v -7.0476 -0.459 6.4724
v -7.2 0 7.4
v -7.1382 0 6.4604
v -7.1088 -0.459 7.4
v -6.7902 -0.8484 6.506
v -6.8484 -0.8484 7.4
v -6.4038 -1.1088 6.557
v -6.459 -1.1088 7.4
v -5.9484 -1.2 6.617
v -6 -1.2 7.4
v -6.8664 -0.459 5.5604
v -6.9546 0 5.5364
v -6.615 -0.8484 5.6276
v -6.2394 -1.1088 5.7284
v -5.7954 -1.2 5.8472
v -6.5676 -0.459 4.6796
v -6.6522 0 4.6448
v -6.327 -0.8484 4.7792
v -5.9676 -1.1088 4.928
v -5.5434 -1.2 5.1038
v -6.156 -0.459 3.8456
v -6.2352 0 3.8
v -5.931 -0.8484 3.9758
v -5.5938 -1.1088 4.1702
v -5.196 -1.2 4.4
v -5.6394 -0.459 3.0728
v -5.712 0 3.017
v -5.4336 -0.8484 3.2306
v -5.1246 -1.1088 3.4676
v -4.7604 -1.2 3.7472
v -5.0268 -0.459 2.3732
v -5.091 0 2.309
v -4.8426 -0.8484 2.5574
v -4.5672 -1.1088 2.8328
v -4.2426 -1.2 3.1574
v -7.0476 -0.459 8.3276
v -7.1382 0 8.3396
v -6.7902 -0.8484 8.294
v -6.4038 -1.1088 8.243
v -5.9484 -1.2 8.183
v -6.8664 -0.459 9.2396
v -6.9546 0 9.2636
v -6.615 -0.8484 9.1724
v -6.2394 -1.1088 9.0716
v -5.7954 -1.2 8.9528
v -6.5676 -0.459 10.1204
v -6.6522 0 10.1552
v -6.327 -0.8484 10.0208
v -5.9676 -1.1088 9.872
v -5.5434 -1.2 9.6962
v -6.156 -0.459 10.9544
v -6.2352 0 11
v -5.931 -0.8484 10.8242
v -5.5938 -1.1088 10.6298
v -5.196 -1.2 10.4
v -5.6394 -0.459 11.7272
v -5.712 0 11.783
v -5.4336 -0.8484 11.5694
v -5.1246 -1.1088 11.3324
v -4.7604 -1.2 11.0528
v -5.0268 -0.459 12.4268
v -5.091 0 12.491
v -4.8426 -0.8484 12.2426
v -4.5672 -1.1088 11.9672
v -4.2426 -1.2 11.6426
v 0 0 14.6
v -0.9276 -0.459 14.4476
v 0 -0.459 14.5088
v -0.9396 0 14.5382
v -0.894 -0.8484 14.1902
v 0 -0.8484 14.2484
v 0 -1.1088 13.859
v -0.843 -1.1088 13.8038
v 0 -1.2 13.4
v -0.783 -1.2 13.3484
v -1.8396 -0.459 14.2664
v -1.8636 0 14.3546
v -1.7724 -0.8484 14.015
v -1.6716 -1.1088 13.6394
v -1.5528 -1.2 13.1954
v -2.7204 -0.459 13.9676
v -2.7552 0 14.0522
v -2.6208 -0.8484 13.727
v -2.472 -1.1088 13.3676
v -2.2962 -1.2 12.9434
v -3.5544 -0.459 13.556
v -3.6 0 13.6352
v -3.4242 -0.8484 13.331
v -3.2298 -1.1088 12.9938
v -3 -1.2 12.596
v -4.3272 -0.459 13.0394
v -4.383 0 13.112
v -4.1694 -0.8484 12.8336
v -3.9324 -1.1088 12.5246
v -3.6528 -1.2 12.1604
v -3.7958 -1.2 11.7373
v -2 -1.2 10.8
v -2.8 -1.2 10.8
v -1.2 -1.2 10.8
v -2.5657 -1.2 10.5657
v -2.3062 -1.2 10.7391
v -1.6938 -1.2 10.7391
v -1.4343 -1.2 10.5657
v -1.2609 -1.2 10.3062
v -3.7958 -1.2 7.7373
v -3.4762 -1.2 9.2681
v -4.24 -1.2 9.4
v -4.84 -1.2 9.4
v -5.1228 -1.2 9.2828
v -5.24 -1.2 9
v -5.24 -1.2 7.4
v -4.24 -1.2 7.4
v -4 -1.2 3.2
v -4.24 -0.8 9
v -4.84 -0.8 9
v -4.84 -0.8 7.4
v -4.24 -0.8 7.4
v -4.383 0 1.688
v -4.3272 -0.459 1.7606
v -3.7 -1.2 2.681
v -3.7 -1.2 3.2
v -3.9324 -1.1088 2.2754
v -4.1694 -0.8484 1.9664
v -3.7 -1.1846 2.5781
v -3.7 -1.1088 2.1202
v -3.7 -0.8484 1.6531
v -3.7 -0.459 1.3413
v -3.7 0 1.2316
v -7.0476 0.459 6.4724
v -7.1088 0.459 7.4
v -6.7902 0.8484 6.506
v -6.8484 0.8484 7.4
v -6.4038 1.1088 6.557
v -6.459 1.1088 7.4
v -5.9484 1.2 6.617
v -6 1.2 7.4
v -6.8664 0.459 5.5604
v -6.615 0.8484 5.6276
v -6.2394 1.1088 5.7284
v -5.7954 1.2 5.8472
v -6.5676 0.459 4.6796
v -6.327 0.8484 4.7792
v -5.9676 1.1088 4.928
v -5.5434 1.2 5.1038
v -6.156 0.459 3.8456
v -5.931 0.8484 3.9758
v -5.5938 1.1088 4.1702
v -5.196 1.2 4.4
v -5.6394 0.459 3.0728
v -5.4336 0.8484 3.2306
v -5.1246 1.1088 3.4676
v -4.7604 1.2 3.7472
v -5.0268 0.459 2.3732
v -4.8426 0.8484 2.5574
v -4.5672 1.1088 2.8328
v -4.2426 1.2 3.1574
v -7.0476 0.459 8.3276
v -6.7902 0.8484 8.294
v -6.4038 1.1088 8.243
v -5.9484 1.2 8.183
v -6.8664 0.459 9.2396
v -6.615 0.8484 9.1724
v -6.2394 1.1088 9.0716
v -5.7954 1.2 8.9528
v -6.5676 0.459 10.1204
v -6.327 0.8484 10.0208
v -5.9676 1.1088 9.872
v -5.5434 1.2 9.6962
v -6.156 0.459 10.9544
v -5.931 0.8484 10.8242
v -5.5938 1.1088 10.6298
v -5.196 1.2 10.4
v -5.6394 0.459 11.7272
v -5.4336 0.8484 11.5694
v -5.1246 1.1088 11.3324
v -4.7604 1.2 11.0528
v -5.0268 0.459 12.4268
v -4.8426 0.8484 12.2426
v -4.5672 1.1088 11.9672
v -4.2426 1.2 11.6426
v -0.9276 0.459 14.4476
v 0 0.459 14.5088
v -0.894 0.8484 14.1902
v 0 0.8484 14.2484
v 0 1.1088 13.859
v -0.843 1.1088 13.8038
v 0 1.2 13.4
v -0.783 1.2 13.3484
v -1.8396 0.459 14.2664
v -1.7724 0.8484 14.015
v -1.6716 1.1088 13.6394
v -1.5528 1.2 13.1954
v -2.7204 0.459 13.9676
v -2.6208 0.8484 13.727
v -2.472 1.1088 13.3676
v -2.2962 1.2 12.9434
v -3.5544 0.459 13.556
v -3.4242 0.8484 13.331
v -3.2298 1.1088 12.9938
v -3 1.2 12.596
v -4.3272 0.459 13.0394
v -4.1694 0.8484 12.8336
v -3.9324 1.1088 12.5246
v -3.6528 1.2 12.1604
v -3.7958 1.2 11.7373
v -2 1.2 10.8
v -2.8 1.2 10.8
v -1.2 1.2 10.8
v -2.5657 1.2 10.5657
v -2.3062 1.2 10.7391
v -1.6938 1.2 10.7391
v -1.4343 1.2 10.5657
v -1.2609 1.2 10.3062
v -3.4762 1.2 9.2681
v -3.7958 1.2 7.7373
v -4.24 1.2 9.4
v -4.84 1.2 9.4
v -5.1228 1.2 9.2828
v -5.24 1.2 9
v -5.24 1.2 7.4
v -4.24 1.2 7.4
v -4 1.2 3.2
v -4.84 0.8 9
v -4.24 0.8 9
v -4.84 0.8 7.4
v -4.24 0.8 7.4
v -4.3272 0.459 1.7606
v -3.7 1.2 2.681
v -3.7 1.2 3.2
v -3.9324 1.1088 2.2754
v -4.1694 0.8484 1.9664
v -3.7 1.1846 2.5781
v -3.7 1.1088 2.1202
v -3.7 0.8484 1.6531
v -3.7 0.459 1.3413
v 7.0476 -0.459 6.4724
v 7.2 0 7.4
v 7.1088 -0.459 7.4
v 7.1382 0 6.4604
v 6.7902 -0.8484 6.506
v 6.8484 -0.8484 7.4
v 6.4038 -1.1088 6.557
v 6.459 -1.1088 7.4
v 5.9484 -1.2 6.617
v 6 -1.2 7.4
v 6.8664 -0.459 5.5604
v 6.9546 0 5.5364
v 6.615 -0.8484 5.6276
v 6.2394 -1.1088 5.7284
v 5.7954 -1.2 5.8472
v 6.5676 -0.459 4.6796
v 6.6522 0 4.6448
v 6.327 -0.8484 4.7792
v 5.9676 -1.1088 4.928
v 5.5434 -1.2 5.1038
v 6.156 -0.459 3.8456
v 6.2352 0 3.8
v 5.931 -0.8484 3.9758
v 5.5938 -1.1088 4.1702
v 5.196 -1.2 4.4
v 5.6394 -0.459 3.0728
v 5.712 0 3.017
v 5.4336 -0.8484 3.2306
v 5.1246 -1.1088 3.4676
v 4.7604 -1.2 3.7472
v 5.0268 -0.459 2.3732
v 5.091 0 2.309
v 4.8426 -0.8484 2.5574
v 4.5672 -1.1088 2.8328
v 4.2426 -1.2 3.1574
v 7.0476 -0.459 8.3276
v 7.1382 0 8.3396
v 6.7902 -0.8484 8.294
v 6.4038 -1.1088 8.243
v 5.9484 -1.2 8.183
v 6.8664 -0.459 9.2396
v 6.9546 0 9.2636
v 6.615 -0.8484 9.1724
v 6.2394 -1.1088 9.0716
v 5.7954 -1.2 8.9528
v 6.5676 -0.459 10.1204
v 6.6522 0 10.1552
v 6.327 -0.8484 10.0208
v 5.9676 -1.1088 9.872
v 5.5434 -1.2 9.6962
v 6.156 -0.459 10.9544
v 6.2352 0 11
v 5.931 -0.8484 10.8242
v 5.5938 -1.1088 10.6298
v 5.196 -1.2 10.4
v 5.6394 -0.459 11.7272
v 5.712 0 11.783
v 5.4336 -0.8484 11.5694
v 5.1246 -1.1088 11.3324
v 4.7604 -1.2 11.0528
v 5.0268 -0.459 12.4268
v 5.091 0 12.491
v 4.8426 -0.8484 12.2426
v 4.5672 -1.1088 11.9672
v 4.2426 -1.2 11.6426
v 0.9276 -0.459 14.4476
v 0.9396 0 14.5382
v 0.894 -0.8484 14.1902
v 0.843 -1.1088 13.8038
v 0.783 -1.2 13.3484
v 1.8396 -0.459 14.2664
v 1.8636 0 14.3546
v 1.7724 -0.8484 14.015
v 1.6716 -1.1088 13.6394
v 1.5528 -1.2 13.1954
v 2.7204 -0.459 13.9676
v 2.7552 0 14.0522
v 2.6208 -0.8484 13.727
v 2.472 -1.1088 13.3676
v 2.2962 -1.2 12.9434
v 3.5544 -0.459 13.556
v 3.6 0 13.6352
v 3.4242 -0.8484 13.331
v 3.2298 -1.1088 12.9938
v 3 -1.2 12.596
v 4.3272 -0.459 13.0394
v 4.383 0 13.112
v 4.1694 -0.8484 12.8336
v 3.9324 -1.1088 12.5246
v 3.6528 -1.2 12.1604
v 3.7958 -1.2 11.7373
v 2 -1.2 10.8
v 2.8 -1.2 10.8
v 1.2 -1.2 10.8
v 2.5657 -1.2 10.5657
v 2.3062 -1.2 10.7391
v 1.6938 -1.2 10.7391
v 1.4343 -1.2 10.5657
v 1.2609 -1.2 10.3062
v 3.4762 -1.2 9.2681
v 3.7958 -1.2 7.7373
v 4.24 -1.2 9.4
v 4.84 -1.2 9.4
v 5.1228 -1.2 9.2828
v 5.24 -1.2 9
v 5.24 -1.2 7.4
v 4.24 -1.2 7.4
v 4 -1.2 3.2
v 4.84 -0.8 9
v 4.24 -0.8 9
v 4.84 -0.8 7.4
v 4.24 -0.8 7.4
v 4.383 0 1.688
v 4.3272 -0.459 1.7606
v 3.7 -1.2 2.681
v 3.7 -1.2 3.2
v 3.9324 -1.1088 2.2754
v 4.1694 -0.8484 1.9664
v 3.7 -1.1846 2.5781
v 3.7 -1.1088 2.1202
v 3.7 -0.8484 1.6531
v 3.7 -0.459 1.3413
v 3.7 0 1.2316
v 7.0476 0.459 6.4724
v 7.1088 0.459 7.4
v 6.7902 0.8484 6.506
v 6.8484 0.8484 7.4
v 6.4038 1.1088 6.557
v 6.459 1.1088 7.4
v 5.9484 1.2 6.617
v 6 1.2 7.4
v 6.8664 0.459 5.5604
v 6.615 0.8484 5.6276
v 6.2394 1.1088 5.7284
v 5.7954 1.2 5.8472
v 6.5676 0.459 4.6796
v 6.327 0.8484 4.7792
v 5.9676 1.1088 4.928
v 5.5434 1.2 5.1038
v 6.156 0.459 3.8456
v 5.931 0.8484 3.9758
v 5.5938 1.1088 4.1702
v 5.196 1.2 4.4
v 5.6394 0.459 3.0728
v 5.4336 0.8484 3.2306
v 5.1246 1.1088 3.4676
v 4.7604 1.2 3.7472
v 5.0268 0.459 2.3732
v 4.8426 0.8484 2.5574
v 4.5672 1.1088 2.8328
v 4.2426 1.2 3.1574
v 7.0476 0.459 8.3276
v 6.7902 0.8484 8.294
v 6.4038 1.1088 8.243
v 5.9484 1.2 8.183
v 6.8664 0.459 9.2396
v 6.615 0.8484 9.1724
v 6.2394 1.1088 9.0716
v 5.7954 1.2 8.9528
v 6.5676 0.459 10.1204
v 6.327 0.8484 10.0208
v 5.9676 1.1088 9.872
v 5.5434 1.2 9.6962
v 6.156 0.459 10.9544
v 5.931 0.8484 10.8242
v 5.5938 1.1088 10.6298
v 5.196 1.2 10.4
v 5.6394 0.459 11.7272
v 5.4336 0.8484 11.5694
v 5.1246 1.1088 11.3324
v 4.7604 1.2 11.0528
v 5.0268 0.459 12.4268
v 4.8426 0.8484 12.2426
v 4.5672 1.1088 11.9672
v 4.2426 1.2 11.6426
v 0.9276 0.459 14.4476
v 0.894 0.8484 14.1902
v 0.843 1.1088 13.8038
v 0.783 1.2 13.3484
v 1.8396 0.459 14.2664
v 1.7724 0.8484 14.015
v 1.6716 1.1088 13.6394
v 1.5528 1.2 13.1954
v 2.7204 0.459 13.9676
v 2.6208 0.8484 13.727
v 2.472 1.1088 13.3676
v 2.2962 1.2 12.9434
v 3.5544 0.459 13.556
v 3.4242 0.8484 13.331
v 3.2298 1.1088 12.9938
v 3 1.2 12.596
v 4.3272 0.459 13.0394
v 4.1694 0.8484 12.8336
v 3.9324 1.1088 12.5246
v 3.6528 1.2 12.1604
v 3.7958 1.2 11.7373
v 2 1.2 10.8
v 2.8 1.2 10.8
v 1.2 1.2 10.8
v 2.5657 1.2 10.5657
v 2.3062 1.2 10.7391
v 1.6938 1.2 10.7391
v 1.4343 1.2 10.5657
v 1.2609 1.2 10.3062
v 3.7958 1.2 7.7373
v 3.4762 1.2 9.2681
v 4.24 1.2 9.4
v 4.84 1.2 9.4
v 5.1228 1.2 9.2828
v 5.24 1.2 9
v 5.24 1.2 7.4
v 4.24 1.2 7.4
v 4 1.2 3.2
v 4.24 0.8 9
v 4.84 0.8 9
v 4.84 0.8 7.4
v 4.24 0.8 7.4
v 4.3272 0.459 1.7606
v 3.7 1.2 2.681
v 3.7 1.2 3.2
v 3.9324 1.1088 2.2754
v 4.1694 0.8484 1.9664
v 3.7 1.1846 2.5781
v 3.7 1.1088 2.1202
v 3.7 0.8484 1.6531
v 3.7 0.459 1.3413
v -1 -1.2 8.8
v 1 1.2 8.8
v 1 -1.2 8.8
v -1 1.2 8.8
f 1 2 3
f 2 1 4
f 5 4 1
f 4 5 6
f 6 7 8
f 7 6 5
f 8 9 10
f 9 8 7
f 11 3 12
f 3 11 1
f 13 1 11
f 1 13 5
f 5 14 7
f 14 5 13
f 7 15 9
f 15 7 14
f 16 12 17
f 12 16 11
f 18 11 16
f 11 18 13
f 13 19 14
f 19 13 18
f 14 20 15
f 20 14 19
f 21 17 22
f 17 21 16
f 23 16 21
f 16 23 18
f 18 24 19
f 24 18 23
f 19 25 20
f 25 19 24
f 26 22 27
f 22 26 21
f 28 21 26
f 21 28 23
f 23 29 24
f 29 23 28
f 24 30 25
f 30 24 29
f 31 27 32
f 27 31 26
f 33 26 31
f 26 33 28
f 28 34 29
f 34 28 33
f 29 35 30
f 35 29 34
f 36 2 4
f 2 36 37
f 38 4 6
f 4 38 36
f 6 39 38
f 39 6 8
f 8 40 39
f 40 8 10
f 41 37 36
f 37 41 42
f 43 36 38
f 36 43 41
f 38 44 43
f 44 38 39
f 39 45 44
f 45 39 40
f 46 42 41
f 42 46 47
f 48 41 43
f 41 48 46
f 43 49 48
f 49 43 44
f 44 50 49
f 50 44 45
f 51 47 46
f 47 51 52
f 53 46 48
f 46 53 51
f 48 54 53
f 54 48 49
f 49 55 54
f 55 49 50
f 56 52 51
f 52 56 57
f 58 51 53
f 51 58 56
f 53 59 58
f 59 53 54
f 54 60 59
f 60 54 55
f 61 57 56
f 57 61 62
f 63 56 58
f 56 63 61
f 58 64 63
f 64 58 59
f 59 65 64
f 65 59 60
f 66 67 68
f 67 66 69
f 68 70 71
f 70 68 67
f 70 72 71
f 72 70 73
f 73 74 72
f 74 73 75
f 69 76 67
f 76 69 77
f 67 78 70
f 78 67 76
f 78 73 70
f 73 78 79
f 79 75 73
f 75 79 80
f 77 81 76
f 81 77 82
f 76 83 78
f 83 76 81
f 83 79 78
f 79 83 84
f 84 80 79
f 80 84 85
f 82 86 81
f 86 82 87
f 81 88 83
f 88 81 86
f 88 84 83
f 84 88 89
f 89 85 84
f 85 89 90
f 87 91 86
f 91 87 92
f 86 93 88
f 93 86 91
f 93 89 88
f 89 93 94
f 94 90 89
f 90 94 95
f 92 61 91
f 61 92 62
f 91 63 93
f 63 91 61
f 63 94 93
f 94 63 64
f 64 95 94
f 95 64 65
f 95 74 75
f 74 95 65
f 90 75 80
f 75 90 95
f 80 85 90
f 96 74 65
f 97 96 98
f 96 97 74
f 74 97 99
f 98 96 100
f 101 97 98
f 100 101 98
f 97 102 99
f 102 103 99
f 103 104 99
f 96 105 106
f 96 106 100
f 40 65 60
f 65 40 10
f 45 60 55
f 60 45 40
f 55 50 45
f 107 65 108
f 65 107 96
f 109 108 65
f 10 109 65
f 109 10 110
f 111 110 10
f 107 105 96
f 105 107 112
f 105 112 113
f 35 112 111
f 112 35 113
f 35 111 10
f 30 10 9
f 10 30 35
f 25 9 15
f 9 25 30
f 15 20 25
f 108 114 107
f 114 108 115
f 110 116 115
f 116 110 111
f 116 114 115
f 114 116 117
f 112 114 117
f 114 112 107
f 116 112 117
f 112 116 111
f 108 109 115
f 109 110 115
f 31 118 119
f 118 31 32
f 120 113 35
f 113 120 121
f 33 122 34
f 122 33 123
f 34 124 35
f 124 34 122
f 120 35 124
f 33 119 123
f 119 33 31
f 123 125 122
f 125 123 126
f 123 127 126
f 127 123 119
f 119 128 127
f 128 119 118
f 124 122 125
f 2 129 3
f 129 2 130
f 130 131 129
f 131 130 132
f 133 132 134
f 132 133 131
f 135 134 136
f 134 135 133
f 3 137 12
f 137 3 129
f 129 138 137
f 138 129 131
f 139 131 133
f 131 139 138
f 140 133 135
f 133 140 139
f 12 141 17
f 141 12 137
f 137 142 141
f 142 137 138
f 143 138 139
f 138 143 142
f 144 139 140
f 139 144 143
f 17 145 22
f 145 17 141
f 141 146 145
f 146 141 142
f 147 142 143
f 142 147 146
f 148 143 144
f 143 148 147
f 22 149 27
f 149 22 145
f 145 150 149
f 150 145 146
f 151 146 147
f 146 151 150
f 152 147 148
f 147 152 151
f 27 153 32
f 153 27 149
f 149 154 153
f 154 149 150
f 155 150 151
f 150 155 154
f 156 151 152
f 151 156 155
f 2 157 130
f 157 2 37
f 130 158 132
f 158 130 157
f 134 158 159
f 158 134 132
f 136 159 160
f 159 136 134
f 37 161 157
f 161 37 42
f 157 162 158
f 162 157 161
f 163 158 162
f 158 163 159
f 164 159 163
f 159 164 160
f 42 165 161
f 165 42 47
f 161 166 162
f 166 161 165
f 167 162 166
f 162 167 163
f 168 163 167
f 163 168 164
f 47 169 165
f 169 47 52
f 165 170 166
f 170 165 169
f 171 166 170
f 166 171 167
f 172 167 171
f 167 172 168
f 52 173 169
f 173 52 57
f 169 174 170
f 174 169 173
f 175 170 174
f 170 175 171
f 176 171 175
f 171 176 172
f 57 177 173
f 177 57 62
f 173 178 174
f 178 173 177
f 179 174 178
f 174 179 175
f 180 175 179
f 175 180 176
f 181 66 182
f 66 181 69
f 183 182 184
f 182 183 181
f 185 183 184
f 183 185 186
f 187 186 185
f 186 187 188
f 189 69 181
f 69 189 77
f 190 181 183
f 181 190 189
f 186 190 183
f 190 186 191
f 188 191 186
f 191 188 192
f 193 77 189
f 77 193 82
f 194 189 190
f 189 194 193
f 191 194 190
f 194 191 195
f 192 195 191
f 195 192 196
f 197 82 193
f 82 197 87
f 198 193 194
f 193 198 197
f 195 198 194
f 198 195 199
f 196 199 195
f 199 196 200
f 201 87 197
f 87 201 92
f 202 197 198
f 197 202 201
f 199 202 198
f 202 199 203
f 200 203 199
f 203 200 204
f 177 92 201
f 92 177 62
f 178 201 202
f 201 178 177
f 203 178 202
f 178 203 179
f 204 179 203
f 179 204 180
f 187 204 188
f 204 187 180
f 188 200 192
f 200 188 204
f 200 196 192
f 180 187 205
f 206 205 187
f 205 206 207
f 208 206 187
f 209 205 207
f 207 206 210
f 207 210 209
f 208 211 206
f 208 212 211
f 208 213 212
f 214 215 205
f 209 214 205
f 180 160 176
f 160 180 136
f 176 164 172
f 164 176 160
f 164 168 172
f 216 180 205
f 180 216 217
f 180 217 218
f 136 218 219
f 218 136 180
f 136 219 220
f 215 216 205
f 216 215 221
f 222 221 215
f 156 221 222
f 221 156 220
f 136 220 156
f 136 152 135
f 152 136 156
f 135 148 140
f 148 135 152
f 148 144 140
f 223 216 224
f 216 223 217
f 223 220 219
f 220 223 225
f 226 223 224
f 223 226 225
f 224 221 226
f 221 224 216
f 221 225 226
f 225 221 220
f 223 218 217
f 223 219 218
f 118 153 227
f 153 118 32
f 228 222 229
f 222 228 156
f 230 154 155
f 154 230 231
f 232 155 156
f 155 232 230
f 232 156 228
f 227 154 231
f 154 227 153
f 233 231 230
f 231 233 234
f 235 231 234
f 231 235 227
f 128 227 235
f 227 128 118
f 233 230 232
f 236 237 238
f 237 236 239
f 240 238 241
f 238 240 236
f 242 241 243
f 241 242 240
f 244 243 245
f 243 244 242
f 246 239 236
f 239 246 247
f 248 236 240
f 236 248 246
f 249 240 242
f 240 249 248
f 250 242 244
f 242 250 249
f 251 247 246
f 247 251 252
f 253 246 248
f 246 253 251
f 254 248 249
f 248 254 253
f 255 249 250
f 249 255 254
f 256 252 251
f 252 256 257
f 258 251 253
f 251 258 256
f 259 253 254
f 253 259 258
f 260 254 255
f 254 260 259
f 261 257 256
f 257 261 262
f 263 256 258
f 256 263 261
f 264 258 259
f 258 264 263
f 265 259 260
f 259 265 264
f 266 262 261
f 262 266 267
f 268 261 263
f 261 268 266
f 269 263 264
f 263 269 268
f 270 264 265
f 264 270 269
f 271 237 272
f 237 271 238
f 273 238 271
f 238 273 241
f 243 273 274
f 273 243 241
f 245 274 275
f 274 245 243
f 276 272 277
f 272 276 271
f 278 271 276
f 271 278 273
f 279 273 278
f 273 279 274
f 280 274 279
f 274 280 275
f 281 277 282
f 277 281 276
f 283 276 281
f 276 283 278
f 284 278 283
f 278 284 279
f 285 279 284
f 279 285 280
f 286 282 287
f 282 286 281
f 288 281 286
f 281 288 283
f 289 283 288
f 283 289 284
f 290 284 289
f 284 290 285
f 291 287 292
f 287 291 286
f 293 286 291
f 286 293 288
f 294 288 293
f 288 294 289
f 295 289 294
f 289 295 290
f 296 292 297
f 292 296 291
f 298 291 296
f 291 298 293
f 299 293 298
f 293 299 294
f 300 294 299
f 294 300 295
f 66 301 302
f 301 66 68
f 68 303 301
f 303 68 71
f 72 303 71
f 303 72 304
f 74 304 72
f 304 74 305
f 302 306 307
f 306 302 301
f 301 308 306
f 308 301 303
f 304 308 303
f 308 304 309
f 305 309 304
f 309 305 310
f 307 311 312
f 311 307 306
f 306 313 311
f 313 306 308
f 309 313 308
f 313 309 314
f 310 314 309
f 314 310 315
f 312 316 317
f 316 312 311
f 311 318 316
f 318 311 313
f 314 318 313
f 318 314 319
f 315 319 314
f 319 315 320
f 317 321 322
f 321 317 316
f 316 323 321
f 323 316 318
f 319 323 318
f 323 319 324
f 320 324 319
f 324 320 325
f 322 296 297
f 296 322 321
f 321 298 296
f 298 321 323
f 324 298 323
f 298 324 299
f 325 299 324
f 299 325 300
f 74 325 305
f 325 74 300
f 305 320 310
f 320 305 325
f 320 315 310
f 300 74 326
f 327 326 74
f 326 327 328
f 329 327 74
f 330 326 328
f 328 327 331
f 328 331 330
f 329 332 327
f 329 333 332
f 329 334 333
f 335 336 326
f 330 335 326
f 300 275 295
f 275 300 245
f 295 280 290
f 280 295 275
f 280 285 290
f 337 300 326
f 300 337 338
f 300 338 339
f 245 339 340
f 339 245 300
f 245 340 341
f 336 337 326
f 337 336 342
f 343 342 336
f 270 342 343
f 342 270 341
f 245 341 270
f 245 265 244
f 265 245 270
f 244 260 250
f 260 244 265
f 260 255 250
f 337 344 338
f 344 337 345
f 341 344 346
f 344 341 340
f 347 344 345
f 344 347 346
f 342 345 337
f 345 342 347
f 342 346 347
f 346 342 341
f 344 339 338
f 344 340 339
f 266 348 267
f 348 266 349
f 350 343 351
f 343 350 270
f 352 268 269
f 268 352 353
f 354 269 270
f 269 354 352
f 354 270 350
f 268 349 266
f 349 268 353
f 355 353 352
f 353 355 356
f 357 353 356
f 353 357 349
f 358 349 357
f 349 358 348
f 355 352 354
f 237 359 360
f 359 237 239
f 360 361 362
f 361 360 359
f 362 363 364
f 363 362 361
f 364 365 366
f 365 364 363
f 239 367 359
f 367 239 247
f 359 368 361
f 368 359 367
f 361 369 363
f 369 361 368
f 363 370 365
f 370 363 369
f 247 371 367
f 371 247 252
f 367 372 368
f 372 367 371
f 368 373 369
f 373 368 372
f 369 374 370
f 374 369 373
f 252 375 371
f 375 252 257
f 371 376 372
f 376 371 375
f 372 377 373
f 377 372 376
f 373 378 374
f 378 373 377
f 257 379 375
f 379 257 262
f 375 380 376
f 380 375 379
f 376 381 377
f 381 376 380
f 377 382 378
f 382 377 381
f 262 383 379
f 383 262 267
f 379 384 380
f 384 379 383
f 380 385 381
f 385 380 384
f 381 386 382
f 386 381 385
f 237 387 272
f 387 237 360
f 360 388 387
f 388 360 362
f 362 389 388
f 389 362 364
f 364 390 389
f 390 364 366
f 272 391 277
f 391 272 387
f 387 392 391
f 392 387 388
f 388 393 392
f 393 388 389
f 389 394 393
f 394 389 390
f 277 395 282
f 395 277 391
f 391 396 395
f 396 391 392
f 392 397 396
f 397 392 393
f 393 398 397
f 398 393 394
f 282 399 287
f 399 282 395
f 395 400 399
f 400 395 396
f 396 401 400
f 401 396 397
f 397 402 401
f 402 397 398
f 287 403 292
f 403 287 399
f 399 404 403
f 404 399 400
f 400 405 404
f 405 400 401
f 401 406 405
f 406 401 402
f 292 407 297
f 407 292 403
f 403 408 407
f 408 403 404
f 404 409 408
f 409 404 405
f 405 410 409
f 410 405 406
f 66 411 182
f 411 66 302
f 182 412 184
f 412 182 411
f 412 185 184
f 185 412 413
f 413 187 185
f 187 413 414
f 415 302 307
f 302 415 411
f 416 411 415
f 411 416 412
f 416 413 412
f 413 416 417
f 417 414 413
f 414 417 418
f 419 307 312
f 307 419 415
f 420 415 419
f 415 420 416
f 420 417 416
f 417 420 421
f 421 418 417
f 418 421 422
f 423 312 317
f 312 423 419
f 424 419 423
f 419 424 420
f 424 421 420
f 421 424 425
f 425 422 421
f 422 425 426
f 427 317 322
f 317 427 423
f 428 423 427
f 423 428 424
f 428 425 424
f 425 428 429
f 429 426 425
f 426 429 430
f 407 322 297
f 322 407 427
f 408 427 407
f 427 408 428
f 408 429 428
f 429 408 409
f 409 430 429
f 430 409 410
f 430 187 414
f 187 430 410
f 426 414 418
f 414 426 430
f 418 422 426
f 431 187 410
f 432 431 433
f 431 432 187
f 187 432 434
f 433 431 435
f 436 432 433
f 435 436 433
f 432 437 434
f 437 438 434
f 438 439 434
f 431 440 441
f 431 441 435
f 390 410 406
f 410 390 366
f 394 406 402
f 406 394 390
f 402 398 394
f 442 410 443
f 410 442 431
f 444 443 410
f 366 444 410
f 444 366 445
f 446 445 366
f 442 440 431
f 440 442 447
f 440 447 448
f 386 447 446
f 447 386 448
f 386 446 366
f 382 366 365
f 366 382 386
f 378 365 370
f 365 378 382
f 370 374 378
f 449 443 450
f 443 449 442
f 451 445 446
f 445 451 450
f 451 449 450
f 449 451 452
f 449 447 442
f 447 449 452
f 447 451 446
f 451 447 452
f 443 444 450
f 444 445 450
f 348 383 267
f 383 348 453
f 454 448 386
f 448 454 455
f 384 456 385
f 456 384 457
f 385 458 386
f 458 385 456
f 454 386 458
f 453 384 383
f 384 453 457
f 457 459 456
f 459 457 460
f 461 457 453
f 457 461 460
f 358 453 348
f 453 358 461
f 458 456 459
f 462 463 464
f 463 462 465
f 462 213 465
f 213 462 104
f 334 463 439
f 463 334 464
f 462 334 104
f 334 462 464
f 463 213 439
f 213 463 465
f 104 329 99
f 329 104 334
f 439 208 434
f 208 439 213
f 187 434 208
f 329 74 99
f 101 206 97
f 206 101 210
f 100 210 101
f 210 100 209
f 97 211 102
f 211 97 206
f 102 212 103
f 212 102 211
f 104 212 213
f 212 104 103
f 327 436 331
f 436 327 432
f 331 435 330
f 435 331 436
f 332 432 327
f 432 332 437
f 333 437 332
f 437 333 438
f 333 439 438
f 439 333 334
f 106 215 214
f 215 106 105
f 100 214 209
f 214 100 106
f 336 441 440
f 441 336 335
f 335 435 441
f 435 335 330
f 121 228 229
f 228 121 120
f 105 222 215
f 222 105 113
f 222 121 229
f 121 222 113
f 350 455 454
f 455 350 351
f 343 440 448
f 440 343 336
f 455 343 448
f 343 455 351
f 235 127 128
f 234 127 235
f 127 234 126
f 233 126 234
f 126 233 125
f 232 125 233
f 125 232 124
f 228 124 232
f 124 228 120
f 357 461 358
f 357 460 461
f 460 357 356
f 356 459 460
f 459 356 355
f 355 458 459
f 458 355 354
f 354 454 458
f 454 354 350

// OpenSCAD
// file: ../p/rect2a.scad
use <../lib.scad>
function ldraw_lib__rect2a() = [
// 0 Rectangle with 2 Adjacent Edges
// 0 Name: rect2a.dat
// 0 Author: Chris Dee [cwdee]
// 0 !LDRAW_ORG Primitive UPDATE 2010-01
// 0 !LICENSE Licensed under CC BY 2.0 and CC BY 4.0 : see CAreadme.txt
// 
// 0 BFC CERTIFY CCW
  [0,"BFC","CERTIFY"],
  [0,"BFC","CCW"],
// 
// 0 !HISTORY 2003-12-19 [PTadmin] Official Update 2003-03
// 0 !HISTORY 2007-06-24 [PTadmin] Header formatted for Contributor Agreement
// 0 !HISTORY 2008-07-01 [PTadmin] Official Update 2008-01
// 0 !HISTORY 2010-01-17 [mikeheide] changed winding to CCW
// 0 !HISTORY 2010-04-05 [PTadmin] Official Update 2010-01
// 
// 
// 2 24 1 0 1 -1 0 1
  [2,24,1,0,1,-1,0,1],
// 2 24 1 0 -1 1 0 1
  [2,24,1,0,-1,1,0,1],
// 4 16 -1 0 1 -1 0 -1 1 0 -1 1 0 1
  [4,16,-1,0,1,-1,0,-1,1,0,-1,1,0,1],
// 0
];
module ldraw_lib__rect2a(step=0, col=false, unit=2/5, alt=false, line=0.2, solid=!$preview)
    makepoly(ldraw_lib__rect2a(), step=step, col=col, unit=unit, alt=alt, line=line, solid=solid);
ldraw_lib__rect2a(line=0.2);
// file: ../p/48/1-8chrd.scad
use <../../lib.scad>
function ldraw_lib__48__1_8chrd() = [
// 0 Hi-Res Chord 0.125
// 0 Name: 48\1-8chrd.dat
// 0 Author: Guy Vivan [guyvivan]
// 0 !LDRAW_ORG 48_Primitive UPDATE 2009-01
// 0 !LICENSE Licensed under CC BY 2.0 and CC BY 4.0 : see CAreadme.txt
// 
// 0 BFC CERTIFY CCW
  [0,"BFC","CERTIFY"],
  [0,"BFC","CCW"],
// 
// 0 !HISTORY 2009-05-02 [PTadmin] Official Update 2009-01
// 
// 
// 4 16 1 0 0 0.9914 0 0.1305 0.7934 0 0.6088 0.7071 0 0.7071
  [4,16,1,0,0,0.9914,0,0.1305,0.7934,0,0.6088,0.7071,0,0.7071],
// 4 16 0.9914 0 0.1305 0.9659 0 0.2588 0.866 0 0.5 0.7934 0 0.6088
  [4,16,0.9914,0,0.1305,0.9659,0,0.2588,0.866,0,0.5,0.7934,0,0.6088],
// 3 16 0.9659 0 0.2588 0.9239 0 0.3827 0.866 0 0.5
  [3,16,0.9659,0,0.2588,0.9239,0,0.3827,0.866,0,0.5],
// 0
];
module ldraw_lib__48__1_8chrd(step=0, col=false, unit=2/5, alt=false, line=0.2, solid=!$preview)
    makepoly(ldraw_lib__48__1_8chrd(), step=step, col=col, unit=unit, alt=alt, line=line, solid=solid);
ldraw_lib__48__1_8chrd(line=0.2);
// file: ../p/3-16ndis.scad
use <../lib.scad>
function ldraw_lib__3_16ndis() = [
// 0 Disc Negative 0.1875
// 0 Name: 3-16ndis.dat
// 0 Author: Guy Vivan [guyvivan]
// 0 !LDRAW_ORG Primitive UPDATE 2009-01
// 0 !LICENSE Licensed under CC BY 2.0 and CC BY 4.0 : see CAreadme.txt
// 
// 0 BFC CERTIFY CCW
  [0,"BFC","CERTIFY"],
  [0,"BFC","CCW"],
// 
// 0 !HISTORY 2009-05-02 [PTadmin] Official Update 2009-01
// 
// 
// 3 16 1 0 1 0.9239 0 0.3827 1 0 0
  [3,16,1,0,1,0.9239,0,0.3827,1,0,0],
// 3 16 1 0 1 0.7071 0 0.7071 0.9239 0 0.3827
  [3,16,1,0,1,0.7071,0,0.7071,0.9239,0,0.3827],
// 3 16 1 0 1 0.3827 0 0.9239 0.7071 0 0.7071
  [3,16,1,0,1,0.3827,0,0.9239,0.7071,0,0.7071],
// 
// 0 end of file
// 
];
module ldraw_lib__3_16ndis(step=0, col=false, unit=2/5, alt=false, line=0.2, solid=!$preview)
    makepoly(ldraw_lib__3_16ndis(), step=step, col=col, unit=unit, alt=alt, line=line, solid=solid);
ldraw_lib__3_16ndis(line=0.2);
// file: ../p/1-8ndis.scad
use <../lib.scad>
function ldraw_lib__1_8ndis() = [
// 0 Disc Negative 0.125
// 0 Name: 1-8ndis.dat
// 0 Author: James Jessiman
// 0 !LDRAW_ORG Primitive UPDATE 2012-01
// 0 !LICENSE Licensed under CC BY 2.0 and CC BY 4.0 : see CAreadme.txt
// 
// 0 BFC CERTIFY CCW
  [0,"BFC","CERTIFY"],
  [0,"BFC","CCW"],
// 
// 0 !HISTORY 2002-03-23 [sbliss] Added BFC statement
// 0 !HISTORY 2002-04-25 [PTadmin] Official Update 2002-02
// 0 !HISTORY 2007-06-22 [PTadmin] Header formatted for Contributor Agreement
// 0 !HISTORY 2008-07-01 [PTadmin] Official Update 2008-01
// 0 !HISTORY 2012-02-16 [Philo] Changed to CCW
// 0 !HISTORY 2012-03-30 [PTadmin] Official Update 2012-01
// 
// 
// 3 16 0.9239 0 0.3827 1 0 0 1 0 1
  [3,16,0.9239,0,0.3827,1,0,0,1,0,1],
// 3 16 0.7071 0 0.7071 0.9239 0 0.3827 1 0 1
  [3,16,0.7071,0,0.7071,0.9239,0,0.3827,1,0,1],
];
module ldraw_lib__1_8ndis(step=0, col=false, unit=2/5, alt=false, line=0.2, solid=!$preview)
    makepoly(ldraw_lib__1_8ndis(), step=step, col=col, unit=unit, alt=alt, line=line, solid=solid);
ldraw_lib__1_8ndis(line=0.2);
// file: ../p/3-16edge.scad
use <../lib.scad>
function ldraw_lib__3_16edge() = [
// 0 Circle 0.1875
// 0 Name: 3-16edge.dat
// 0 Author: Donald Sutter [technog]
// 0 !LDRAW_ORG Primitive UPDATE 2017-01
// 0 !LICENSE Licensed under CC BY 2.0 and CC BY 4.0 : see CAreadme.txt
// 
// 0 BFC CERTIFY CCW
  [0,"BFC","CERTIFY"],
  [0,"BFC","CCW"],
// 
// 0 !HISTORY 2004-03-02 [PTadmin] Official Update 2004-01
// 0 !HISTORY 2007-06-24 [PTadmin] Header formatted for Contributor Agreement
// 0 !HISTORY 2008-07-01 [PTadmin] Official Update 2008-01
// 0 !HISTORY 2017-01-15 [Steffen] BFCed
// 0 !HISTORY 2017-12-30 [PTadmin] Official Update 2017-01
// 
// 
// 2 24 1 0 0 0.9239 0 0.3827
  [2,24,1,0,0,0.9239,0,0.3827],
// 2 24 0.9239 0 0.3827 0.7071 0 0.7071
  [2,24,0.9239,0,0.3827,0.7071,0,0.7071],
// 2 24 0.7071 0 0.7071 0.3827 0 0.9239
  [2,24,0.7071,0,0.7071,0.3827,0,0.9239],
];
module ldraw_lib__3_16edge(step=0, col=false, unit=2/5, alt=false, line=0.2, solid=!$preview)
    makepoly(ldraw_lib__3_16edge(), step=step, col=col, unit=unit, alt=alt, line=line, solid=solid);
ldraw_lib__3_16edge(line=0.2);
// file: ../p/3-16cyli.scad
use <../lib.scad>
function ldraw_lib__3_16cyli() = [
// 0 Cylinder 0.1875
// 0 Name: 3-16cyli.dat
// 0 Author: Mark Kennedy [mkennedy]
// 0 !LDRAW_ORG Primitive UPDATE 2005-01
// 0 !LICENSE Licensed under CC BY 2.0 and CC BY 4.0 : see CAreadme.txt
// 
// 0 BFC CERTIFY CCW
  [0,"BFC","CERTIFY"],
  [0,"BFC","CCW"],
// 
// 0 !HISTORY 2004-03-02 [PTadmin] Official Update 2004-01
// 0 !HISTORY 2004-12-11 [nielsk] Recreated using Primitive Generator, Edge lines fixed, BFC changed to CCW
// 0 !HISTORY 2005-12-28 [PTadmin] Official Update 2005-01
// 0 !HISTORY 2007-06-24 [PTadmin] Header formatted for Contributor Agreement
// 0 !HISTORY 2008-07-01 [PTadmin] Official Update 2008-01
// 
// 
// 4 16 .9239 1 .3827 .9239 0 .3827 1 0 0 1 1 0
  [4,16,.9239,1,.3827,.9239,0,.3827,1,0,0,1,1,0],
// 4 16 .7071 1 .7071 .7071 0 .7071 .9239 0 .3827 .9239 1 .3827
  [4,16,.7071,1,.7071,.7071,0,.7071,.9239,0,.3827,.9239,1,.3827],
// 4 16 .3827 1 .9239 .3827 0 .9239 .7071 0 .7071 .7071 1 .7071
  [4,16,.3827,1,.9239,.3827,0,.9239,.7071,0,.7071,.7071,1,.7071],
// 5 24 1 1 0 1 0 0 1 1 -.4142 .9239 1 .3827
  [5,24,1,1,0,1,0,0,1,1,-.4142,.9239,1,.3827],
// 5 24 .9239 1 .3827 .9239 0 .3827 1 1 0 .7071 1 .7071
  [5,24,.9239,1,.3827,.9239,0,.3827,1,1,0,.7071,1,.7071],
// 5 24 .7071 1 .7071 .7071 0 .7071 .9239 1 .3827 .3827 1 .9239
  [5,24,.7071,1,.7071,.7071,0,.7071,.9239,1,.3827,.3827,1,.9239],
// 5 24 .3827 1 .9239 .3827 0 .9239 .7071 1 .7071 0 1 1.0824
  [5,24,.3827,1,.9239,.3827,0,.9239,.7071,1,.7071,0,1,1.0824],
// 0
];
module ldraw_lib__3_16cyli(step=0, col=false, unit=2/5, alt=false, line=0.2, solid=!$preview)
    makepoly(ldraw_lib__3_16cyli(), step=step, col=col, unit=unit, alt=alt, line=line, solid=solid);
ldraw_lib__3_16cyli(line=0.2);
// file: ../p/1-8edge.scad
use <../lib.scad>
function ldraw_lib__1_8edge() = [
// 0 Circle 0.125
// 0 Name: 1-8edge.dat
// 0 Author: James Jessiman
// 0 !LDRAW_ORG Primitive UPDATE 2017-01
// 0 !LICENSE Licensed under CC BY 2.0 and CC BY 4.0 : see CAreadme.txt
// 
// 0 BFC CERTIFY CCW
  [0,"BFC","CERTIFY"],
  [0,"BFC","CCW"],
// 
// 0 !HISTORY 2007-06-22 [PTadmin] Header formatted for Contributor Agreement
// 0 !HISTORY 2008-07-01 [PTadmin] Official Update 2008-01
// 0 !HISTORY 2017-01-15 [Steffen] BFCed
// 0 !HISTORY 2017-12-30 [PTadmin] Official Update 2017-01
// 
// 
// 2 24 1 0 0 0.9239 0 0.3827
  [2,24,1,0,0,0.9239,0,0.3827],
// 2 24 0.9239 0 0.3827 0.7071 0 0.7071
  [2,24,0.9239,0,0.3827,0.7071,0,0.7071],
];
module ldraw_lib__1_8edge(step=0, col=false, unit=2/5, alt=false, line=0.2, solid=!$preview)
    makepoly(ldraw_lib__1_8edge(), step=step, col=col, unit=unit, alt=alt, line=line, solid=solid);
ldraw_lib__1_8edge(line=0.2);
// file: ../p/1-8cyli.scad
use <../lib.scad>
function ldraw_lib__1_8cyli() = [
// 0 Cylinder 0.125
// 0 Name: 1-8cyli.dat
// 0 Author: James Jessiman
// 0 !LDRAW_ORG Primitive UPDATE 2005-01
// 0 !LICENSE Licensed under CC BY 2.0 and CC BY 4.0 : see CAreadme.txt
// 
// 0 BFC CERTIFY CCW
  [0,"BFC","CERTIFY"],
  [0,"BFC","CCW"],
// 
// 0 !HISTORY 2002-04-25 [PTadmin] Official Update 2002-02
// 0 !HISTORY 2004-12-11 [nielsk] Recreated using Primitive Generator, Edge lines fixed, BFC changed to CCW
// 0 !HISTORY 2005-12-28 [PTadmin] Official Update 2005-01
// 0 !HISTORY 2007-06-22 [PTadmin] Header formatted for Contributor Agreement
// 0 !HISTORY 2008-07-01 [PTadmin] Official Update 2008-01
// 
// 
// 4 16 .9239 1 .3827 .9239 0 .3827 1 0 0 1 1 0
  [4,16,.9239,1,.3827,.9239,0,.3827,1,0,0,1,1,0],
// 4 16 .7071 1 .7071 .7071 0 .7071 .9239 0 .3827 .9239 1 .3827
  [4,16,.7071,1,.7071,.7071,0,.7071,.9239,0,.3827,.9239,1,.3827],
// 5 24 1 1 0 1 0 0 1 1 -.4142 .9239 1 .3827
  [5,24,1,1,0,1,0,0,1,1,-.4142,.9239,1,.3827],
// 5 24 .9239 1 .3827 .9239 0 .3827 1 1 0 .7071 1 .7071
  [5,24,.9239,1,.3827,.9239,0,.3827,1,1,0,.7071,1,.7071],
// 5 24 .7071 1 .7071 .7071 0 .7071 .9239 1 .3827 .4142 1 1
  [5,24,.7071,1,.7071,.7071,0,.7071,.9239,1,.3827,.4142,1,1],
// 0
];
module ldraw_lib__1_8cyli(step=0, col=false, unit=2/5, alt=false, line=0.2, solid=!$preview)
    makepoly(ldraw_lib__1_8cyli(), step=step, col=col, unit=unit, alt=alt, line=line, solid=solid);
ldraw_lib__1_8cyli(line=0.2);
// file: ../p/rect3.scad
use <../lib.scad>
function ldraw_lib__rect3() = [
// 0 Rectangle with 3 Edges
// 0 Name: rect3.dat
// 0 Author: Mark Kennedy [mkennedy]
// 0 !LDRAW_ORG Primitive UPDATE 2010-01
// 0 !LICENSE Licensed under CC BY 2.0 and CC BY 4.0 : see CAreadme.txt
// 
// 0 BFC CERTIFY CCW
  [0,"BFC","CERTIFY"],
  [0,"BFC","CCW"],
// 
// 0 !HISTORY 2003-08-01 [PTadmin] Official Update 2003-02
// 0 !HISTORY 2007-06-24 [PTadmin] Header formatted for Contributor Agreement
// 0 !HISTORY 2008-07-01 [PTadmin] Official Update 2008-01
// 0 !HISTORY 2010-01-17 [mikeheide] Change winding to CCW
// 0 !HISTORY 2010-04-05 [PTadmin] Official Update 2010-01
// 
// 
// 2 24 1 0 1 -1 0 1
  [2,24,1,0,1,-1,0,1],
// 2 24 1 0 1 1 0 -1
  [2,24,1,0,1,1,0,-1],
// 2 24 -1 0 1 -1 0 -1
  [2,24,-1,0,1,-1,0,-1],
// 4 16 -1 0 1 -1 0 -1 1 0 -1 1 0 1
  [4,16,-1,0,1,-1,0,-1,1,0,-1,1,0,1],
// 0 //
];
module ldraw_lib__rect3(step=0, col=false, unit=2/5, alt=false, line=0.2, solid=!$preview)
    makepoly(ldraw_lib__rect3(), step=step, col=col, unit=unit, alt=alt, line=line, solid=solid);
ldraw_lib__rect3(line=0.2);
// file: ../p/rect2p.scad
use <../lib.scad>
function ldraw_lib__rect2p() = [
// 0 Rectangle with 2 Parallel Edges
// 0 Name: rect2p.dat
// 0 Author: Donald Sutter [technog]
// 0 !LDRAW_ORG Primitive UPDATE 2010-01
// 0 !LICENSE Licensed under CC BY 2.0 and CC BY 4.0 : see CAreadme.txt
// 
// 0 BFC CERTIFY CCW
  [0,"BFC","CERTIFY"],
  [0,"BFC","CCW"],
// 
// 0 !HISTORY 2003-08-01 [PTadmin] Official Update 2003-02
// 0 !HISTORY 2007-06-24 [PTadmin] Header formatted for Contributor Agreement
// 0 !HISTORY 2008-07-01 [PTadmin] Official Update 2008-01
// 0 !HISTORY 2010-01-17 [mikeheide] changed winding to CCW
// 0 !HISTORY 2010-04-05 [PTadmin] Official Update 2010-01
// 
// 
// 2 24 1 0 1 -1 0 1
  [2,24,1,0,1,-1,0,1],
// 2 24 -1 0 -1 1 0 -1
  [2,24,-1,0,-1,1,0,-1],
// 4 16 -1 0 1 -1 0 -1 1 0 -1 1 0 1
  [4,16,-1,0,1,-1,0,-1,1,0,-1,1,0,1],
// 0
];
module ldraw_lib__rect2p(step=0, col=false, unit=2/5, alt=false, line=0.2, solid=!$preview)
    makepoly(ldraw_lib__rect2p(), step=step, col=col, unit=unit, alt=alt, line=line, solid=solid);
ldraw_lib__rect2p(line=0.2);
// file: ../p/rect.scad
use <../lib.scad>
function ldraw_lib__rect() = [
// 0 Rectangle
// 0 Name: rect.dat
// 0 Author: James Jessiman
// 0 !LDRAW_ORG Primitive UPDATE 2010-01
// 0 !LICENSE Licensed under CC BY 2.0 and CC BY 4.0 : see CAreadme.txt
// 
// 0 BFC CERTIFY CCW
  [0,"BFC","CERTIFY"],
  [0,"BFC","CCW"],
// 
// 0 !HISTORY 2002-04-05 [hafhead] Added BFC statement
// 0 !HISTORY 2002-04-25 [PTadmin] Official Update 2002-02
// 0 !HISTORY 2007-06-24 [PTadmin] Header formatted for Contributor Agreement
// 0 !HISTORY 2008-07-01 [PTadmin] Official Update 2008-01
// 0 !HISTORY 2010-01-17 [mikeheide] changed winding to CCW
// 0 !HISTORY 2010-04-05 [PTadmin] Official Update 2010-01
// 
// 
// 2 24 1 0 1 -1 0 1
  [2,24,1,0,1,-1,0,1],
// 2 24 -1 0 1 -1 0 -1
  [2,24,-1,0,1,-1,0,-1],
// 2 24 -1 0 -1 1 0 -1
  [2,24,-1,0,-1,1,0,-1],
// 2 24 1 0 -1 1 0 1
  [2,24,1,0,-1,1,0,1],
// 4 16 -1 0 1 -1 0 -1 1 0 -1 1 0 1
  [4,16,-1,0,1,-1,0,-1,1,0,-1,1,0,1],
// 0
];
module ldraw_lib__rect(step=0, col=false, unit=2/5, alt=false, line=0.2, solid=!$preview)
    makepoly(ldraw_lib__rect(), step=step, col=col, unit=unit, alt=alt, line=line, solid=solid);
ldraw_lib__rect(line=0.2);
// file: ../p/3-16cylo.scad
use <../lib.scad>
use <3-16cyli.scad>
use <3-16edge.scad>
function ldraw_lib__3_16cylo() = [
// 0 Cylinder Open 0.1875
// 0 Name: 3-16cylo.dat
// 0 Author: J.C. Tchang [tchang]
// 0 !LDRAW_ORG Primitive UPDATE 2013-01
// 0 !LICENSE Licensed under CC BY 2.0 and CC BY 4.0 : see CAreadme.txt
// 
// 0 BFC CERTIFY CCW
  [0,"BFC","CERTIFY"],
  [0,"BFC","CCW"],
// 
// 0 !HISTORY 2013-07-21 [PTadmin] Official Update 2013-01
// 
// 
// 1 16 0 0 0 1 0 0 0 1 0 0 0 1 3-16edge.dat
  [1,16,0,0,0,1,0,0,0,1,0,0,0,1, ldraw_lib__3_16edge()],
// 1 16 0 1 0 1 0 0 0 1 0 0 0 1 3-16edge.dat
  [1,16,0,1,0,1,0,0,0,1,0,0,0,1, ldraw_lib__3_16edge()],
// 1 16 0 0 0 1 0 0 0 1 0 0 0 1 3-16cyli.dat
  [1,16,0,0,0,1,0,0,0,1,0,0,0,1, ldraw_lib__3_16cyli()],
];
module ldraw_lib__3_16cylo(step=0, col=false, unit=2/5, alt=false, line=0.2, solid=!$preview)
    makepoly(ldraw_lib__3_16cylo(), step=step, col=col, unit=unit, alt=alt, line=line, solid=solid);
ldraw_lib__3_16cylo(line=0.2);
// file: ../p/1-8cylo.scad
use <../lib.scad>
use <1-8cyli.scad>
use <1-8edge.scad>
function ldraw_lib__1_8cylo() = [
// 0 Cylinder Open 0.125
// 0 Name: 1-8cylo.dat
// 0 Author: Tim Gould [timgould]
// 0 !LDRAW_ORG Primitive UPDATE 2012-03
// 0 !LICENSE Licensed under CC BY 2.0 and CC BY 4.0 : see CAreadme.txt
// 
// 0 BFC CERTIFY CCW
  [0,"BFC","CERTIFY"],
  [0,"BFC","CCW"],
// 
// 0 !HISTORY 2012-12-28 [PTadmin] Official Update 2012-03
// 
// 
// 1 16 0 0 0 1 0 0 0 1 0 0 0 1 1-8edge.dat
  [1,16,0,0,0,1,0,0,0,1,0,0,0,1, ldraw_lib__1_8edge()],
// 1 16 0 1 0 1 0 0 0 1 0 0 0 1 1-8edge.dat
  [1,16,0,1,0,1,0,0,0,1,0,0,0,1, ldraw_lib__1_8edge()],
// 1 16 0 0 0 1 0 0 0 1 0 0 0 1 1-8cyli.dat
  [1,16,0,0,0,1,0,0,0,1,0,0,0,1, ldraw_lib__1_8cyli()],
];
module ldraw_lib__1_8cylo(step=0, col=false, unit=2/5, alt=false, line=0.2, solid=!$preview)
    makepoly(ldraw_lib__1_8cylo(), step=step, col=col, unit=unit, alt=alt, line=line, solid=solid);
ldraw_lib__1_8cylo(line=0.2);
// main file
use <../lib.scad>
use <../p/1-8cylo.scad>
use <../p/3-16cylo.scad>
use <../p/rect.scad>
use <../p/rect2p.scad>
use <../p/rect3.scad>
use <s/13733s01.scad>
function ldraw_lib__13733() = [
// 0 ~Minifig Head Round  1.8 x  1.8 Biscuit Filling
// 0 Name: 13733.dat
// 0 Author: Gerald Lasser [GeraldLasser]
// 0 !LDRAW_ORG Part UPDATE 2022-01
// 0 !LICENSE Licensed under CC BY 2.0 and CC BY 4.0 : see CAreadme.txt
// 
// 0 BFC CERTIFY CCW
  [0,"BFC","CERTIFY"],
  [0,"BFC","CCW"],
// 
// 0 !HISTORY 2022-01-14 [PTadmin] Official Update 2022-01
// 
// 
// 1 16 0 0 0 1 0 0 0 1 0 0 0 1 s\13733s01.dat
  [1,16,0,0,0,1,0,0,0,1,0,0,0,1, ldraw_lib__s__13733s01()],
// 1 16 0 0 0 1 0 0 0 1 0 0 0 -1 s\13733s01.dat
  [1,16,0,0,0,1,0,0,0,1,0,0,0,-1, ldraw_lib__s__13733s01()],
// 1 16 0 0 0 -1 0 0 0 1 0 0 0 1 s\13733s01.dat
  [1,16,0,0,0,-1,0,0,0,1,0,0,0,1, ldraw_lib__s__13733s01()],
// 1 16 0 0 0 -1 0 0 0 1 0 0 0 -1 s\13733s01.dat
  [1,16,0,0,0,-1,0,0,0,1,0,0,0,-1, ldraw_lib__s__13733s01()],
// 
// 1 16 0 -22 0 0 0 2.5 0 -1 0 -3 0 0 rect.dat
  [1,16,0,-22,0,0,0,2.5,0,-1,0,-3,0,0, ldraw_lib__rect()],
// 1 16 -2.8261 -23.8827 0 .3261 0 0 1.8827 -1 0 0 0 3 rect2p.dat
  [1,16,-2.8261,-23.8827,0,.3261,0,0,1.8827,-1,0,0,0,3, ldraw_lib__rect2p()],
// 1 16 2.8261 -23.8827 0 .3261 0 0 -1.8827 -1 0 0 0 3 rect2p.dat
  [1,16,2.8261,-23.8827,0,.3261,0,0,-1.8827,-1,0,0,0,3, ldraw_lib__rect2p()],
// 4 16 -3.1522 -25.7654 -3 -2.5 -22 -3 2.5 -22 -3 3.1522 -25.7654 -3
  [4,16,-3.1522,-25.7654,-3,-2.5,-22,-3,2.5,-22,-3,3.1522,-25.7654,-3],
// 4 16 3.1522 -25.7654 3 2.5 -22 3 -2.5 -22 3 -3.1522 -25.7654 3
  [4,16,3.1522,-25.7654,3,2.5,-22,3,-2.5,-22,3,-3.1522,-25.7654,3],
// 4 16 -3 -27 -3 -3.1522 -25.7654 -3 3.1522 -25.7654 -3 3 -27 -3
  [4,16,-3,-27,-3,-3.1522,-25.7654,-3,3.1522,-25.7654,-3,3,-27,-3],
// 4 16 3 -27 3 3.1522 -25.7654 3 -3.1522 -25.7654 3 -3 -27 3
  [4,16,3,-27,3,3.1522,-25.7654,3,-3.1522,-25.7654,3,-3,-27,3],
// 3 16 0 -33.5 3 3 -27 3 -3 -27 3
  [3,16,0,-33.5,3,3,-27,3,-3,-27,3],
// 3 16 3 -27 -3 0 -33.5 -3 -3 -27 -3
  [3,16,3,-27,-3,0,-33.5,-3,-3,-27,-3],
// 5 24 -3.1522 -25.7654 -3 -3.1522 -25.7654 3 -2.5 -22 3 -3.5858 -26.4142 3
  [5,24,-3.1522,-25.7654,-3,-3.1522,-25.7654,3,-2.5,-22,3,-3.5858,-26.4142,3],
// 5 24 3.1522 -25.7654 -3 3.1522 -25.7654 3 3.5858 -26.4142 3 2.5 -22 3
  [5,24,3.1522,-25.7654,-3,3.1522,-25.7654,3,3.5858,-26.4142,3,2.5,-22,3],
// 
// 0 BFC INVERTNEXT
  [0,"BFC","INVERTNEXT"],
// 1 16 -5 -25 3 0 0 -2 -2 0 0 0 -6 0 1-8cylo.dat
  [1,16,-5,-25,3,0,0,-2,-2,0,0,0,-6,0, ldraw_lib__1_8cylo()],
// 0 BFC INVERTNEXT
  [0,"BFC","INVERTNEXT"],
// 1 16 -5 -25 3 0 0 2 -2 0 0 0 -6 0 3-16cylo.dat
  [1,16,-5,-25,3,0,0,2,-2,0,0,0,-6,0, ldraw_lib__3_16cylo()],
// 0 BFC INVERTNEXT
  [0,"BFC","INVERTNEXT"],
// 1 16 5 -25 3 0 0 2 -2 0 0 0 -6 0 1-8cylo.dat
  [1,16,5,-25,3,0,0,2,-2,0,0,0,-6,0, ldraw_lib__1_8cylo()],
// 0 BFC INVERTNEXT
  [0,"BFC","INVERTNEXT"],
// 1 16 5 -25 3 0 0 -2 -2 0 0 0 -6 0 3-16cylo.dat
  [1,16,5,-25,3,0,0,-2,-2,0,0,0,-6,0, ldraw_lib__3_16cylo()],
// 0 BFC INVERTNEXT
  [0,"BFC","INVERTNEXT"],
// 1 16 1.0104 -19.3432 3 -10.5 0 0 0 0 -10 0 -6 0 1-8cylo.dat
  [1,16,1.0104,-19.3432,3,-10.5,0,0,0,0,-10,0,-6,0, ldraw_lib__1_8cylo()],
// 0 BFC INVERTNEXT
  [0,"BFC","INVERTNEXT"],
// 1 16 -1.0104 -19.3432 3 10.5 0 0 0 0 -10 0 -6 0 1-8cylo.dat
  [1,16,-1.0104,-19.3432,3,10.5,0,0,0,0,-10,0,-6,0, ldraw_lib__1_8cylo()],
// 
// 1 16 -9.25 -7.3512975 0 0 -1 0 0 0 -.6487025 3 0 0 rect3.dat
  [1,16,-9.25,-7.3512975,0,0,-1,0,0,0,-.6487025,3,0,0, ldraw_lib__rect3()],
// 1 16 -9.7448 -13.6716 0 0 0 -.2552 0 -1 5.6716 -3 0 0 rect3.dat
  [1,16,-9.7448,-13.6716,0,0,0,-.2552,0,-1,5.6716,-3,0,0, ldraw_lib__rect3()],
// 1 16 -9.625 -8 0 .375 0 0 0 1 0 0 0 3 rect2p.dat
  [1,16,-9.625,-8,0,.375,0,0,0,1,0,0,0,3, ldraw_lib__rect2p()],
// 1 16 9.25 -7.3512975 0 0 1 0 0 0 -.6487025 3 0 0 rect3.dat
  [1,16,9.25,-7.3512975,0,0,1,0,0,0,-.6487025,3,0,0, ldraw_lib__rect3()],
// 1 16 9.7448 -13.6716 0 0 0 .2552 0 -1 5.6716 -3 0 0 rect3.dat
  [1,16,9.7448,-13.6716,0,0,0,.2552,0,-1,5.6716,-3,0,0, ldraw_lib__rect3()],
// 1 16 9.625 -8 0 -.375 0 0 0 1 0 0 0 3 rect2p.dat
  [1,16,9.625,-8,0,-.375,0,0,0,1,0,0,0,3, ldraw_lib__rect2p()],
// 
// 3 16 -9.25 -3.3533 1.1475 -9.25 -3.3533 -1.1475 -9.25 -3.079 0
  [3,16,-9.25,-3.3533,1.1475,-9.25,-3.3533,-1.1475,-9.25,-3.079,0],
// 4 16 -9.25 -4.1327 -2.121 -9.25 -3.3533 -1.1475 -9.25 -3.3533 1.1475 -9.25 -4.1327 2.121
  [4,16,-9.25,-4.1327,-2.121,-9.25,-3.3533,-1.1475,-9.25,-3.3533,1.1475,-9.25,-4.1327,2.121],
// 4 16 -9.25 -4.1327 2.121 -9.25 -5.3005 2.772 -9.25 -5.3005 -2.772 -9.25 -4.1327 -2.121
  [4,16,-9.25,-4.1327,2.121,-9.25,-5.3005,2.772,-9.25,-5.3005,-2.772,-9.25,-4.1327,-2.121],
// 4 16 -9.25 -6.4453 -2.9615 -9.25 -5.3005 -2.772 -9.25 -5.3005 2.772 -9.25 -6.445296 2.961511
  [4,16,-9.25,-6.4453,-2.9615,-9.25,-5.3005,-2.772,-9.25,-5.3005,2.772,-9.25,-6.445296,2.961511],
// 4 16 -9.25 -6.4453 -2.9615 -9.25 -6.445296 2.961511 -9.25 -6.7026 3 -9.25 -6.7026 -3
  [4,16,-9.25,-6.4453,-2.9615,-9.25,-6.445296,2.961511,-9.25,-6.7026,3,-9.25,-6.7026,-3],
// 
// 3 16 9.25 -3.3533 -1.1475 9.25 -3.3533 1.1475 9.25 -3.079 0
  [3,16,9.25,-3.3533,-1.1475,9.25,-3.3533,1.1475,9.25,-3.079,0],
// 4 16 9.25 -3.3533 1.1475 9.25 -3.3533 -1.1475 9.25 -4.1327 -2.121 9.25 -4.1327 2.121
  [4,16,9.25,-3.3533,1.1475,9.25,-3.3533,-1.1475,9.25,-4.1327,-2.121,9.25,-4.1327,2.121],
// 4 16 9.25 -5.3005 -2.772 9.25 -5.3005 2.772 9.25 -4.1327 2.121 9.25 -4.1327 -2.121
  [4,16,9.25,-5.3005,-2.772,9.25,-5.3005,2.772,9.25,-4.1327,2.121,9.25,-4.1327,-2.121],
// 4 16 9.25 -5.3005 2.772 9.25 -5.3005 -2.772 9.25 -6.4453 -2.9615 9.25 -6.4453 2.9615
  [4,16,9.25,-5.3005,2.772,9.25,-5.3005,-2.772,9.25,-6.4453,-2.9615,9.25,-6.4453,2.9615],
// 4 16 9.25 -6.7026 3 9.25 -6.4453 2.9615 9.25 -6.4453 -2.9615 9.25 -6.7026 -3
  [4,16,9.25,-6.7026,3,9.25,-6.4453,2.9615,9.25,-6.4453,-2.9615,9.25,-6.7026,-3],
// 
// 5 24 -9.25 -3.079 0 -10.9575 -4.22 0 -10.818 -4.4015 -1.1475 -10.818 -4.4015 1.1475
  [5,24,-9.25,-3.079,0,-10.9575,-4.22,0,-10.818,-4.4015,-1.1475,-10.818,-4.4015,1.1475],
// 5 24 -10.9575 -4.22 0 -12.7275 -5.7725 0 -12.567 -5.933 -1.1475 -12.567 -5.933 1.1475
  [5,24,-10.9575,-4.22,0,-12.7275,-5.7725,0,-12.567,-5.933,-1.1475,-12.567,-5.933,1.1475],
// 5 24 9.25 -3.079 0 10.9575 -4.22 0 10.818 -4.4015 -1.1475 10.818 -4.4015 1.1475
  [5,24,9.25,-3.079,0,10.9575,-4.22,0,10.818,-4.4015,-1.1475,10.818,-4.4015,1.1475],
// 5 24 10.9575 -4.22 0 12.7275 -5.7725 0 12.567 -5.933 -1.1475 12.567 -5.933 1.1475
  [5,24,10.9575,-4.22,0,12.7275,-5.7725,0,12.567,-5.933,-1.1475,12.567,-5.933,1.1475],
];
module ldraw_lib__13733(step=0, col=false, unit=2/5, alt=false, line=0.2, solid=!$preview)
    makepoly(ldraw_lib__13733(), step=step, col=col, unit=unit, alt=alt, line=line, solid=solid);
ldraw_lib__13733(line=0.2);
